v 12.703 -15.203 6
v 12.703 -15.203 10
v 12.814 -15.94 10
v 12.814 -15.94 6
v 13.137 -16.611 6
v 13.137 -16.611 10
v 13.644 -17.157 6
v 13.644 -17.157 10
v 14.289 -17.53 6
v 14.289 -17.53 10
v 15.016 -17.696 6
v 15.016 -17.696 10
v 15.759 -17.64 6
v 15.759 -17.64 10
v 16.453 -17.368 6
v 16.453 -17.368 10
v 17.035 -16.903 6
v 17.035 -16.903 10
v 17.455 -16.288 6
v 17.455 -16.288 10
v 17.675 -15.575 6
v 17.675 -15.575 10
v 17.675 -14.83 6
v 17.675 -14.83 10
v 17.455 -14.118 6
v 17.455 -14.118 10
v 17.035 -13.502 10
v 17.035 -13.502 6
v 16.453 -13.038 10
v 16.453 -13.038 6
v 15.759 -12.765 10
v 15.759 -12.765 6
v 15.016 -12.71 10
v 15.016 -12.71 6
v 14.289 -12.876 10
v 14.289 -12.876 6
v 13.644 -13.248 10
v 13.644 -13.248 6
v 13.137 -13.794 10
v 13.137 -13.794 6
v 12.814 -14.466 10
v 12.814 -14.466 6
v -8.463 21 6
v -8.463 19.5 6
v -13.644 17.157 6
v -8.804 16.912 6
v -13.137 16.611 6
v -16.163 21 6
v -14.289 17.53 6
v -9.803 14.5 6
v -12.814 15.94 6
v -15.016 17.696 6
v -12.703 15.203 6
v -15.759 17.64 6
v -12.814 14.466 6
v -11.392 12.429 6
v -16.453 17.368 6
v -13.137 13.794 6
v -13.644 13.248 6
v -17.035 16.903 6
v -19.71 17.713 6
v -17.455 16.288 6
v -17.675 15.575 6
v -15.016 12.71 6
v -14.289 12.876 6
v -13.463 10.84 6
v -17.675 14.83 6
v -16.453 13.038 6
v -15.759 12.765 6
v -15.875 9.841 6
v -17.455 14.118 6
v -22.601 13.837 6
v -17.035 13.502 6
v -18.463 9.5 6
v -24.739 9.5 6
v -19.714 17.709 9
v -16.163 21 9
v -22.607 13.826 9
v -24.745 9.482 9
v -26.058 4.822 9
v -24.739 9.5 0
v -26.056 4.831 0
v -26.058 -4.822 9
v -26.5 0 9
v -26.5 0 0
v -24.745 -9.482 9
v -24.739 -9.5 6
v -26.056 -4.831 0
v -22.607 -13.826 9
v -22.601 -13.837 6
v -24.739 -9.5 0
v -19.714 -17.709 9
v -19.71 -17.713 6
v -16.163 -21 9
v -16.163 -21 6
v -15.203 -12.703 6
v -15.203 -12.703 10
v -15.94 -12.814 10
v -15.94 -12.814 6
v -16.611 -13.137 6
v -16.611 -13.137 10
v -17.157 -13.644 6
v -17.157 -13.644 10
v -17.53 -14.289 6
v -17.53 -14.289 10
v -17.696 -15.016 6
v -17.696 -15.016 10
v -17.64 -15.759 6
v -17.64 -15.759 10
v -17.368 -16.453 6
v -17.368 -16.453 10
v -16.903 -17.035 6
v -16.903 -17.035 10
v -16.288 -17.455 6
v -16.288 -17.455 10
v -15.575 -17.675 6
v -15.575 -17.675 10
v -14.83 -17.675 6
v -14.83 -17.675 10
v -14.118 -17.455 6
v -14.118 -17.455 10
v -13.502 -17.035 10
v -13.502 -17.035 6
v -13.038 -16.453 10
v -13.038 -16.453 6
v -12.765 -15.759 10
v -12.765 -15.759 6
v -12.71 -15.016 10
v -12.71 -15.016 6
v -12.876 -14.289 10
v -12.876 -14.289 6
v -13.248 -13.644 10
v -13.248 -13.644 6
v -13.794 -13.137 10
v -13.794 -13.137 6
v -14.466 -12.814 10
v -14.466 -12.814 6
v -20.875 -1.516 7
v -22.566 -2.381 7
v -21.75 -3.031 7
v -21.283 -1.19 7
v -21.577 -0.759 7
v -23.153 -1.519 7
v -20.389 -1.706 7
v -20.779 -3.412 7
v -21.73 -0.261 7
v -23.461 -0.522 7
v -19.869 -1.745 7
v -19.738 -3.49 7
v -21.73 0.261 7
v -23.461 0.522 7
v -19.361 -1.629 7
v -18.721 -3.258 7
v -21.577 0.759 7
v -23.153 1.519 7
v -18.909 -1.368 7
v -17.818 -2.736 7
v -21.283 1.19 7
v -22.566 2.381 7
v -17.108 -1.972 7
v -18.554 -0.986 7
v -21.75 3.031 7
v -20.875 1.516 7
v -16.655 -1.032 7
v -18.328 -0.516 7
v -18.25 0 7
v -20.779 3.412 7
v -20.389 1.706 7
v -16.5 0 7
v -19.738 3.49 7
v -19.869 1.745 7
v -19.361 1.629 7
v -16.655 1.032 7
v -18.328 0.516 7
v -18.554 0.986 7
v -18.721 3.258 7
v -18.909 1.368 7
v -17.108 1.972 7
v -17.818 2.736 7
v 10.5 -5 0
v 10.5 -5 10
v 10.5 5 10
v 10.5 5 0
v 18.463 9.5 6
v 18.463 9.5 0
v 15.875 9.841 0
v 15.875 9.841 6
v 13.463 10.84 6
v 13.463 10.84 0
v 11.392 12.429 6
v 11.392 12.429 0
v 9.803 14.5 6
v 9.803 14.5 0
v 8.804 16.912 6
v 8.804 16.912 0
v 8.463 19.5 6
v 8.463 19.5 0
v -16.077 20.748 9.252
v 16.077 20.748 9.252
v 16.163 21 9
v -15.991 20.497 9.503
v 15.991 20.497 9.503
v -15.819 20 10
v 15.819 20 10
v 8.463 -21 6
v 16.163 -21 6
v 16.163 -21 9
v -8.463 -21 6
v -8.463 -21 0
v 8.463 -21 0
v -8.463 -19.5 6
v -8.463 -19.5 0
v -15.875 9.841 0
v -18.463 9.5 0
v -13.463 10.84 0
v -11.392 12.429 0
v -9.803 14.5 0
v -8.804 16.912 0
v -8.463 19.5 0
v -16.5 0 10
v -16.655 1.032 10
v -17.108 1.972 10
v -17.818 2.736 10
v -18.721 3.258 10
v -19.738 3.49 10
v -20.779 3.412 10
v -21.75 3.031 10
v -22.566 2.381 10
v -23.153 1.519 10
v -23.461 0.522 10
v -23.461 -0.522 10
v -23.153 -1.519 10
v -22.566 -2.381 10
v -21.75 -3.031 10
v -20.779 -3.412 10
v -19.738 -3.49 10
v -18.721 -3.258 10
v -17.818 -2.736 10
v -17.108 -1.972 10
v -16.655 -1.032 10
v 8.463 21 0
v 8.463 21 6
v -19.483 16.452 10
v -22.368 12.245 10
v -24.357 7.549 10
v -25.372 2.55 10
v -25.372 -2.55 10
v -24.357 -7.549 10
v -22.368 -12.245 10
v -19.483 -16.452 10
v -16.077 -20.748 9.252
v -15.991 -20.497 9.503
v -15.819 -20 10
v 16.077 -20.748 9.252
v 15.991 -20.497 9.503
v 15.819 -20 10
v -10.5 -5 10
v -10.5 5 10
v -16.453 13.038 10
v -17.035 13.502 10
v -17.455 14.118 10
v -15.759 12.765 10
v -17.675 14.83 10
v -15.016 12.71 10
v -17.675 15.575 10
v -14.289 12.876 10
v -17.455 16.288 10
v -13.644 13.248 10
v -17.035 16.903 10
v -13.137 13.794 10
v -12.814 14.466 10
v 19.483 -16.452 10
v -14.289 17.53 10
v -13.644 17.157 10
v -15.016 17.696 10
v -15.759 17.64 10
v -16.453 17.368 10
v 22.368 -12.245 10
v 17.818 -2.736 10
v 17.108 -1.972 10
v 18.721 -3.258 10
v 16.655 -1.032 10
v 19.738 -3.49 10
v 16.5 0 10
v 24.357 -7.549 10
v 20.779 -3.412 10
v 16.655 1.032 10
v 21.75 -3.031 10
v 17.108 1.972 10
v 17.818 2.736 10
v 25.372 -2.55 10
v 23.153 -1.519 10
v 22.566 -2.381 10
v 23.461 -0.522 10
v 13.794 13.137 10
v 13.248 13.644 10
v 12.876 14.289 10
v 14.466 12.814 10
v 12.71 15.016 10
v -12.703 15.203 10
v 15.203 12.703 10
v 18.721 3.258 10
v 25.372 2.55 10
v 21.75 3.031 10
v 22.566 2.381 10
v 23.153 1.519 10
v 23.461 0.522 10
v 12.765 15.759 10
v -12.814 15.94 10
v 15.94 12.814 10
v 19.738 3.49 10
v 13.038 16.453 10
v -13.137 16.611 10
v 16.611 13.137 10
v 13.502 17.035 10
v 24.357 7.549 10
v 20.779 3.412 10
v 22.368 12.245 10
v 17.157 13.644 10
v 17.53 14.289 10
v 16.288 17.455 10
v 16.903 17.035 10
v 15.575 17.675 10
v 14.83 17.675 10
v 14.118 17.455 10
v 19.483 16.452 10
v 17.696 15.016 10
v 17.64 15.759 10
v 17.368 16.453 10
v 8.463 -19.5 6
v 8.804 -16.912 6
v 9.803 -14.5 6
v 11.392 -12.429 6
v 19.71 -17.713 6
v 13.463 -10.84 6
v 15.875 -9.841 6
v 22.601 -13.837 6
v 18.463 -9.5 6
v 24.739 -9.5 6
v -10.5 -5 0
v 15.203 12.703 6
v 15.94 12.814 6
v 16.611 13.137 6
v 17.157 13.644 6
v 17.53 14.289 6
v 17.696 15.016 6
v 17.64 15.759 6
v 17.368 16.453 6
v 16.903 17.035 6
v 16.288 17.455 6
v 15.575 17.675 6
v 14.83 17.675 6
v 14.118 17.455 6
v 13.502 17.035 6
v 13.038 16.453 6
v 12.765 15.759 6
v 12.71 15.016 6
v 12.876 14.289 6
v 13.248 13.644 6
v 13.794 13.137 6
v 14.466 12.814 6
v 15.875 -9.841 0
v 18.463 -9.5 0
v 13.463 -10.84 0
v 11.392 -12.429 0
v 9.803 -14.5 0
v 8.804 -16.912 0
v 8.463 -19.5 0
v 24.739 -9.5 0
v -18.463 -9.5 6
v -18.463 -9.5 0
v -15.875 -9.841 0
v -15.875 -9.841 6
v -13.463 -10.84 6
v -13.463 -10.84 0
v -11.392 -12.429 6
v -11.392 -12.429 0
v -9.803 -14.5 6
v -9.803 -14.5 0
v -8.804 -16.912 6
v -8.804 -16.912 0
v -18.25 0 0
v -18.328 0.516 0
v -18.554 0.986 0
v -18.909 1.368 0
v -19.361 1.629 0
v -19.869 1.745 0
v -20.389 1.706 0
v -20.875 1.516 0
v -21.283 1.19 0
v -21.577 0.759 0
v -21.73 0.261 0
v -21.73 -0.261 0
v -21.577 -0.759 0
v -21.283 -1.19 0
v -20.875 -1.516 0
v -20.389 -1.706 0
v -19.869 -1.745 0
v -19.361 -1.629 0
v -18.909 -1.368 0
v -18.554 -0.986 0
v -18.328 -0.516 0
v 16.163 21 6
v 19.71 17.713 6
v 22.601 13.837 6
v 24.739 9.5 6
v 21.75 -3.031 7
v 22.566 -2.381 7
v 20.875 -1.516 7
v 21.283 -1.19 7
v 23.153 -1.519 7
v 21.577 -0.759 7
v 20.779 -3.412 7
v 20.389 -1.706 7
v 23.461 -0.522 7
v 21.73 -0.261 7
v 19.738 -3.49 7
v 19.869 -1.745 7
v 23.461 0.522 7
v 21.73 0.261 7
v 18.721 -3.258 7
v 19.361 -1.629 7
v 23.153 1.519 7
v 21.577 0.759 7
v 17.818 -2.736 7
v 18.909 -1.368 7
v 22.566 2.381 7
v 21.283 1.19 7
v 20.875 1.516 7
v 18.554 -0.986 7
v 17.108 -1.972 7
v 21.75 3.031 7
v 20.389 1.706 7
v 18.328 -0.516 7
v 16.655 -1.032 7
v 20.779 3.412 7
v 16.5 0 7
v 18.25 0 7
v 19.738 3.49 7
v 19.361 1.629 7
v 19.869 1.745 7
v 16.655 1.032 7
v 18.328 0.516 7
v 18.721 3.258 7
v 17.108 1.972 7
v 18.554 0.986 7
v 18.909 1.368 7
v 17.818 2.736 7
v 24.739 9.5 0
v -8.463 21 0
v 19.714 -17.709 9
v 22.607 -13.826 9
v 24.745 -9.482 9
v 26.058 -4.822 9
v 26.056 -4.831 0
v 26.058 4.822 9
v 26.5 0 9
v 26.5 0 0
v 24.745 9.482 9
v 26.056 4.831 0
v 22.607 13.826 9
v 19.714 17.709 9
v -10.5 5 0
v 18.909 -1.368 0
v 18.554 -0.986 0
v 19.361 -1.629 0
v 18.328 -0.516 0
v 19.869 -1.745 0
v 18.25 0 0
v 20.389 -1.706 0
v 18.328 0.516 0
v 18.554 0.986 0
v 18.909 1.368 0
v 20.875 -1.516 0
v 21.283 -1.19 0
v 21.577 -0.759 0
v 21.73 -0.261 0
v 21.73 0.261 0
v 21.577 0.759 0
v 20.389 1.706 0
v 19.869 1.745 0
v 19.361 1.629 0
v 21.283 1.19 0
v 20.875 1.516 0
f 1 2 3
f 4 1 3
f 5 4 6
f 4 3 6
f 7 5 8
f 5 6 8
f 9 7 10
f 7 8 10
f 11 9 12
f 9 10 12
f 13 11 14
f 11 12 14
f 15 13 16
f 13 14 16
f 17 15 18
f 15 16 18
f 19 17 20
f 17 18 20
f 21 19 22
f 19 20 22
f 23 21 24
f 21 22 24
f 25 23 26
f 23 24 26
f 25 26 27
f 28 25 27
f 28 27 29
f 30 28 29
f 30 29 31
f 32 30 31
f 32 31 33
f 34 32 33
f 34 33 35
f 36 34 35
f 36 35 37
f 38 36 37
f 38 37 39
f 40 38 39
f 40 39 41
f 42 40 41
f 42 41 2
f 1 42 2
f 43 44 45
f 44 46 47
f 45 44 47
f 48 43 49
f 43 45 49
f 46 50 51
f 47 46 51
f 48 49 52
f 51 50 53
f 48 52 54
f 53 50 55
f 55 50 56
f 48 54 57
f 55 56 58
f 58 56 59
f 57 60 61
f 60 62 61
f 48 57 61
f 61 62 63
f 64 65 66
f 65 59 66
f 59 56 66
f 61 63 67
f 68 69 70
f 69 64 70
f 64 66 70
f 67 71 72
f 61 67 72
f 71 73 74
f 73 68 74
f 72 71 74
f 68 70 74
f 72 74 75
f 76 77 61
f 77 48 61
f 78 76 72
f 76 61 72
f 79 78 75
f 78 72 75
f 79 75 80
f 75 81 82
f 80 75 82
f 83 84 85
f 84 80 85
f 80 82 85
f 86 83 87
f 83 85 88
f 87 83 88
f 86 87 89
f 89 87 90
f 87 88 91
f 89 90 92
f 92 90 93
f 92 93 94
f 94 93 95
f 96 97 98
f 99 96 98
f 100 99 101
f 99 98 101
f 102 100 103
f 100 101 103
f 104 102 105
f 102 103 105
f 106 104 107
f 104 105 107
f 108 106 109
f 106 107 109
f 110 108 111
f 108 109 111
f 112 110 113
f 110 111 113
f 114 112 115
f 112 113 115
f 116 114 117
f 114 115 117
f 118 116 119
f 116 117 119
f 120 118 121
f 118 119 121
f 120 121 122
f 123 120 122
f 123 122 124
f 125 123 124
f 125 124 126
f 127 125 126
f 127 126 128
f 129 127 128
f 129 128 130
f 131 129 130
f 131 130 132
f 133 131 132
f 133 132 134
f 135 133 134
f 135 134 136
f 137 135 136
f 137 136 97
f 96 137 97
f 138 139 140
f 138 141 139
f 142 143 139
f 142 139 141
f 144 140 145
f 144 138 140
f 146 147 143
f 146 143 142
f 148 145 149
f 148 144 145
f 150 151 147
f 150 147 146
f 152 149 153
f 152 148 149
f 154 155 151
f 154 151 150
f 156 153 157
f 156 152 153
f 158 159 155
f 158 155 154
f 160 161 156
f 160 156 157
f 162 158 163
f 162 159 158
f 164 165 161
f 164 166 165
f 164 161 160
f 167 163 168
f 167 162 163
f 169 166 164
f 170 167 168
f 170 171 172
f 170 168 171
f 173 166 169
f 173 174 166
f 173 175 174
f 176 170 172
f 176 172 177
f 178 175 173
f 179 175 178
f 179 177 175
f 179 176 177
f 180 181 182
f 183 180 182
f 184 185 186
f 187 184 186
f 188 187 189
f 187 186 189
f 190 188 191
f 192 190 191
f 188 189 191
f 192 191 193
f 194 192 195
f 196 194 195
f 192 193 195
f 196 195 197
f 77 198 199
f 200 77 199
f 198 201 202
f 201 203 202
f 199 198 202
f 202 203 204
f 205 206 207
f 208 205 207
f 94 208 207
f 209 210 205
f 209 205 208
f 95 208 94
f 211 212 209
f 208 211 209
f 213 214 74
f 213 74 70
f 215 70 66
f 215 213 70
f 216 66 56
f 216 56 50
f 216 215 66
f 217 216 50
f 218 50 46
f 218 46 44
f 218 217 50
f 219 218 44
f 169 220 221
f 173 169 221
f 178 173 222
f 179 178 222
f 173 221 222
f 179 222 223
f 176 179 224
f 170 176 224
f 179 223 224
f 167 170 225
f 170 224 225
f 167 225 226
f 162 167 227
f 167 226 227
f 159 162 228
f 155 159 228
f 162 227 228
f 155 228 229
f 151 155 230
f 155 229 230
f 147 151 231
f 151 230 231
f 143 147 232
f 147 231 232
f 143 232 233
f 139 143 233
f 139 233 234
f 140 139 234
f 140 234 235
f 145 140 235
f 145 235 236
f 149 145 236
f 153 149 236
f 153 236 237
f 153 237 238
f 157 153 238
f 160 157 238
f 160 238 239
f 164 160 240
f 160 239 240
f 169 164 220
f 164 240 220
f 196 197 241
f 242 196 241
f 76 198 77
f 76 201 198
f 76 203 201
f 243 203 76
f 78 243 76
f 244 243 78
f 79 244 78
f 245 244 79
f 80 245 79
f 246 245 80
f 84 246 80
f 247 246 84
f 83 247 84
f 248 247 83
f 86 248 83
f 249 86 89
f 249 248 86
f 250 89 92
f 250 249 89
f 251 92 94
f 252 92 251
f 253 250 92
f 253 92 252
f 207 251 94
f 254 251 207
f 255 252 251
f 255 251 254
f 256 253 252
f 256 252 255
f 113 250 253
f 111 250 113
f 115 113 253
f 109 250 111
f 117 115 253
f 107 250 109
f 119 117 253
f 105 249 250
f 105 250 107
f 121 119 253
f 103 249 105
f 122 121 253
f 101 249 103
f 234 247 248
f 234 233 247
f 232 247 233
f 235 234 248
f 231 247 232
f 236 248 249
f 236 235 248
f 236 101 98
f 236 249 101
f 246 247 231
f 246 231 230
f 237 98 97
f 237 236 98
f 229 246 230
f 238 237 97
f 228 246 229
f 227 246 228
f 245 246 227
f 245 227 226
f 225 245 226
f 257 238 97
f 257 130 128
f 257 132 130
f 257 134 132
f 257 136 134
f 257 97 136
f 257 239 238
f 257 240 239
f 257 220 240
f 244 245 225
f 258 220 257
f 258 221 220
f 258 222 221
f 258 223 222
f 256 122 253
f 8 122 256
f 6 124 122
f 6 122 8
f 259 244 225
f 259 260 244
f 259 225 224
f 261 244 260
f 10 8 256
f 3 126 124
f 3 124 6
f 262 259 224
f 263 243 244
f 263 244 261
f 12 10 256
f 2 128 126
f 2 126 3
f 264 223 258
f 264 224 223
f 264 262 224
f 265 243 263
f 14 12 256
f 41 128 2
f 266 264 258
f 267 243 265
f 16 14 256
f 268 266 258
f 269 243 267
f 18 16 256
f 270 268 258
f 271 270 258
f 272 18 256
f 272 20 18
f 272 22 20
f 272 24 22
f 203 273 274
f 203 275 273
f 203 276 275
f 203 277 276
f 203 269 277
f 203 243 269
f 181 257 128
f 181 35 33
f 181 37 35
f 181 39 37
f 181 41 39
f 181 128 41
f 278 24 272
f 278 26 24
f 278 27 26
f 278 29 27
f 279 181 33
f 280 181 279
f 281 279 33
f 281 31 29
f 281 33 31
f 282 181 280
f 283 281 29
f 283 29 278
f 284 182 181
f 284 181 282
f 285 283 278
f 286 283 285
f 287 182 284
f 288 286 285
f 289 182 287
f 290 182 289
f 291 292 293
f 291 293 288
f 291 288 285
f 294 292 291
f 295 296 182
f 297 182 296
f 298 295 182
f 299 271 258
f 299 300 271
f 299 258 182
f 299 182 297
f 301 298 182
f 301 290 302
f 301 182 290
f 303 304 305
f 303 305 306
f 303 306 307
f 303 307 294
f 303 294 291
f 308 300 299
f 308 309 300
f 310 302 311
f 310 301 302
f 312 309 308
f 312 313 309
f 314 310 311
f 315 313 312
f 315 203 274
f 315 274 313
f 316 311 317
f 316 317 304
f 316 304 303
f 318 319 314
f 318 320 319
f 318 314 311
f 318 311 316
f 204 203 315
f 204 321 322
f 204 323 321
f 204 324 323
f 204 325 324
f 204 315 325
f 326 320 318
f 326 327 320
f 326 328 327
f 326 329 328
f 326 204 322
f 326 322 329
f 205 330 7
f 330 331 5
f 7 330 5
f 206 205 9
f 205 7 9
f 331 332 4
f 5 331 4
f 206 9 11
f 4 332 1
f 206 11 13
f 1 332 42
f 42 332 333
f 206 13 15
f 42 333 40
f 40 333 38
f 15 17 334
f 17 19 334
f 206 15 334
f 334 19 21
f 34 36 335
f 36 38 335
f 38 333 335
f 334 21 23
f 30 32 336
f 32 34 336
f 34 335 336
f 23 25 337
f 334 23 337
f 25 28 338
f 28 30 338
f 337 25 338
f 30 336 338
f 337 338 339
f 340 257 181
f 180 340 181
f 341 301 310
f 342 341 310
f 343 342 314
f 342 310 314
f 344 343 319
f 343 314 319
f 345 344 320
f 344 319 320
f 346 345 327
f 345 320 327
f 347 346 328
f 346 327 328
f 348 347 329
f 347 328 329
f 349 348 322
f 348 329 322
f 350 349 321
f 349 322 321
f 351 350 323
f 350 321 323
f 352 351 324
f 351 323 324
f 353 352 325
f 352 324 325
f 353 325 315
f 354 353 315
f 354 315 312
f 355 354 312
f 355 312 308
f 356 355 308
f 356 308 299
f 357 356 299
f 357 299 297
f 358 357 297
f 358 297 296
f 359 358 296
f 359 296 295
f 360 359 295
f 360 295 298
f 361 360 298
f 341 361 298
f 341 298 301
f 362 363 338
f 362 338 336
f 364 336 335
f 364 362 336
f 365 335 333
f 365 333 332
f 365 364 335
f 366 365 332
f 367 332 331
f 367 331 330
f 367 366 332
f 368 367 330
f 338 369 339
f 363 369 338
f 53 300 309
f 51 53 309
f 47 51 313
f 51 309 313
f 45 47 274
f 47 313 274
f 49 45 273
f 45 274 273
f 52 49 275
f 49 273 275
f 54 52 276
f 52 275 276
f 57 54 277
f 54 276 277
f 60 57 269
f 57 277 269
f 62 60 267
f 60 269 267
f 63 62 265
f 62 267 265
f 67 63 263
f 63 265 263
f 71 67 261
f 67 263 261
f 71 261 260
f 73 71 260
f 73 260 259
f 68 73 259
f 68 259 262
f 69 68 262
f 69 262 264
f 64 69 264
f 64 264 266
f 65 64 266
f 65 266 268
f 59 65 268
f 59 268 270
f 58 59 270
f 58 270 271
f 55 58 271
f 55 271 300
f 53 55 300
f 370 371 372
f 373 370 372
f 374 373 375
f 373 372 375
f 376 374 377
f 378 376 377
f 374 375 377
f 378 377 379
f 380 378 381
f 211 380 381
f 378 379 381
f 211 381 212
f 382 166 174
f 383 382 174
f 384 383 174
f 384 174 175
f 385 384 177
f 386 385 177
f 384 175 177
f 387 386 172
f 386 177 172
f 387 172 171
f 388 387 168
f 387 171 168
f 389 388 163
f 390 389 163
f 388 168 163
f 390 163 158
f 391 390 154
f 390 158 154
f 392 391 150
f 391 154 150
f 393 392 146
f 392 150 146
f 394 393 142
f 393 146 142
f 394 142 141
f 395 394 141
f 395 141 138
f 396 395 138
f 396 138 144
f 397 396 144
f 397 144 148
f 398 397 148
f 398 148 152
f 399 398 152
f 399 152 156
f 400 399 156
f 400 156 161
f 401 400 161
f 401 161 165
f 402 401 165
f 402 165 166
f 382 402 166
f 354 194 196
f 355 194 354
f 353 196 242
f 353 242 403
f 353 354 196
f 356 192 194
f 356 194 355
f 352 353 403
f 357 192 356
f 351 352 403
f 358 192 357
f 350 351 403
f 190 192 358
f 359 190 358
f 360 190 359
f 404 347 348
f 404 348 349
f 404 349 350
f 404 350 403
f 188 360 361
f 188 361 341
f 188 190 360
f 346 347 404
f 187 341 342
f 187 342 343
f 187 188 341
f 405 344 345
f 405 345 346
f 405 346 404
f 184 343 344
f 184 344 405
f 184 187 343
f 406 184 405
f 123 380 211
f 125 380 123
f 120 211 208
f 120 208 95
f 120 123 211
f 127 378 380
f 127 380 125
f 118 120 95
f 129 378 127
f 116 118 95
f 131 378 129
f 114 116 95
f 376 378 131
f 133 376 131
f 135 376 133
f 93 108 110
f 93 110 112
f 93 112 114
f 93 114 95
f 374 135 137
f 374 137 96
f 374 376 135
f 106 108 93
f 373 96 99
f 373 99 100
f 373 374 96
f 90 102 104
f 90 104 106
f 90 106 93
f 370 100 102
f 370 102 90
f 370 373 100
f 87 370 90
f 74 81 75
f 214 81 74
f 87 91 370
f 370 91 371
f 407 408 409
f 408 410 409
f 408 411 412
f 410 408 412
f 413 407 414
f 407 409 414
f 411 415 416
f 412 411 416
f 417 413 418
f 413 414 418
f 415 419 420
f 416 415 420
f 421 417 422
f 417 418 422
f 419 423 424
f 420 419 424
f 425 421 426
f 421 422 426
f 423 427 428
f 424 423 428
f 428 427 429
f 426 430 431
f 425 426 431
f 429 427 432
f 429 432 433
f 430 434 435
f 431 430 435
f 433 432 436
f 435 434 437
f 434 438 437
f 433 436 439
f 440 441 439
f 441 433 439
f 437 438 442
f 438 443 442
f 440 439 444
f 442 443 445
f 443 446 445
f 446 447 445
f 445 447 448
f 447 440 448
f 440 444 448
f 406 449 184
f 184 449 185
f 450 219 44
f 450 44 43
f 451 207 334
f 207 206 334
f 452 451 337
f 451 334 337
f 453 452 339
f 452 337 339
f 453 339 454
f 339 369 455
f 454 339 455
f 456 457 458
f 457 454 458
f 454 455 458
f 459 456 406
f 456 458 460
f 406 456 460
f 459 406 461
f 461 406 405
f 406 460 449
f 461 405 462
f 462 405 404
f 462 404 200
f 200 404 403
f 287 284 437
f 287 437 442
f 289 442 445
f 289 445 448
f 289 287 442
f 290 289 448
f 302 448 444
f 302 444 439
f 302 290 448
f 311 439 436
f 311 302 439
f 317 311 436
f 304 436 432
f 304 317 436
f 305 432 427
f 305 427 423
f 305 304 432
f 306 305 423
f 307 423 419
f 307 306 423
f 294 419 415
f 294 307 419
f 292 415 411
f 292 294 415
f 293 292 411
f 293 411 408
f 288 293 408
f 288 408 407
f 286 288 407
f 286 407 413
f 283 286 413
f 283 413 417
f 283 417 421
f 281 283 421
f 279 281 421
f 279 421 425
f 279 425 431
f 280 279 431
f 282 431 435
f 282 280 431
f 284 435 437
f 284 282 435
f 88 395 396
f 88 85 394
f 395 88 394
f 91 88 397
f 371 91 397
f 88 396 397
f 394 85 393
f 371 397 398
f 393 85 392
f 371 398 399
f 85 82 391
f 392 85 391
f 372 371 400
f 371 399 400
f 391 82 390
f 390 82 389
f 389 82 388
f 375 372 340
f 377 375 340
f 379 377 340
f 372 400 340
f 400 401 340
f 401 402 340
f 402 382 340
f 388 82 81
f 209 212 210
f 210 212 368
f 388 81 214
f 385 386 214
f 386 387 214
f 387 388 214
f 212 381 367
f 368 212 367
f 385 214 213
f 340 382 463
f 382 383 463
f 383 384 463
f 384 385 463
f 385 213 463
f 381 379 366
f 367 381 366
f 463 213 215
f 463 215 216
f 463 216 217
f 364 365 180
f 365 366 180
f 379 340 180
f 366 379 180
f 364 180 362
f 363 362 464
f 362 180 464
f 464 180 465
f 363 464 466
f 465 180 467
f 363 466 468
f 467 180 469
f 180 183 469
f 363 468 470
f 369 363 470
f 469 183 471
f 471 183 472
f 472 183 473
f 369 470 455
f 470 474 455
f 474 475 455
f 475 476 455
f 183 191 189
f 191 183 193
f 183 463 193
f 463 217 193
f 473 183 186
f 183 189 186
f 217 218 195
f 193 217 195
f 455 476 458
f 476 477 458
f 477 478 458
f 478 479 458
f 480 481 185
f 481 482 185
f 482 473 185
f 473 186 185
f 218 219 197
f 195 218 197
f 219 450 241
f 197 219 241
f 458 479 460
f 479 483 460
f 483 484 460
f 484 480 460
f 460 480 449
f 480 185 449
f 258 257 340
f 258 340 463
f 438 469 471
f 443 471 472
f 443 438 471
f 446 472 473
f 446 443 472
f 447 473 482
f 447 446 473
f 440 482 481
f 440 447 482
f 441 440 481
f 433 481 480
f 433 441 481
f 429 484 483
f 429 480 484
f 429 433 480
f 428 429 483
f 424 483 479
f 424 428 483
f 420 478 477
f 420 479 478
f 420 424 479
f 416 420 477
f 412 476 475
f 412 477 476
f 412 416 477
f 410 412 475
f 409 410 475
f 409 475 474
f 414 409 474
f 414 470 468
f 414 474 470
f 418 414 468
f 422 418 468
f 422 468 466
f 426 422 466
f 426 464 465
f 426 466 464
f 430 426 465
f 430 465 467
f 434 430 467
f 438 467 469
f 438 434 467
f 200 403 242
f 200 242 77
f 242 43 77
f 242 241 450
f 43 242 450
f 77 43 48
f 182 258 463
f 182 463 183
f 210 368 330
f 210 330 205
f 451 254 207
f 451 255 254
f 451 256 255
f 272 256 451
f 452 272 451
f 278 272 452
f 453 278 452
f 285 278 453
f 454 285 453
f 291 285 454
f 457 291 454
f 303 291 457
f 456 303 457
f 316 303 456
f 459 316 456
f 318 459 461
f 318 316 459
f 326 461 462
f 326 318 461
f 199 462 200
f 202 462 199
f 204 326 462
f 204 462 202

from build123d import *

# Parameters (mm, degrees)
SKETCH_1_R               = 26.5
EXTRUDE_1_DEPTH          = 10
SKETCH_5_R               = 2.5
CUT_EXTRUDE_4_DEPTH      = 11
PATTERN_CIRCULAR_1_COUNT = 4
CHAMFER_1_SIZE           = 1
SKETCH_6_W               = 30
SKETCH_6_H               = 30
SKETCH_8_W               = 21
SKETCH_8_H               = 10
CUT_EXTRUDE_5_DEPTH      = 11
SKETCH_9_R               = 2.5
CUT_EXTRUDE_7_DEPTH      = 6
MIRROR_3_COPY_1_SKETCH_R = 2.5
MIRROR_3_COPY_1_DEPTH    = 6
SKETCH_12_R              = 3.5
CUT_EXTRUDE_8_DEPTH      = 3
SKETCH_13_R              = 1.75
CUT_EXTRUDE_9_DEPTH      = 8
CHAMFER_2_SIZE           = 1


with BuildPart() as part:
    # Эскиз1 → Бобышка-Вытянуть1 (new body)
    with BuildSketch(Plane.XY):
        Circle(SKETCH_1_R)
    extrude(amount=EXTRUDE_1_DEPTH)

    # Эскиз5 → Вырез-Вытянуть4 (cut, through all)
    with BuildSketch(Plane.XY.offset(10)):
        with Locations((-15.202795796, 15.202795796)):
            Circle(SKETCH_5_R)
    cut_extrude_4 = extrude(amount=-CUT_EXTRUDE_4_DEPTH, mode=Mode.SUBTRACT)

    # Круговой массив1: Вырез-Вытянуть4 ×4 about axis
    pattern_circular_1_axis = Axis((0, 0, 0), (0, 0, 1))
    for i in range(1, PATTERN_CIRCULAR_1_COUNT):
        add(cut_extrude_4.rotate(pattern_circular_1_axis, i * 360 / PATTERN_CIRCULAR_1_COUNT), mode=Mode.SUBTRACT)

    # Фаска1
    chamfer_1_edges = [part.edges().sort_by_distance(p)[0] for p in [
        (-26.5, 0, 10),
    ]]
    chamfer(chamfer_1_edges, length=CHAMFER_1_SIZE)

    # Эскиз6 → Вырез-Повернуть1 (revolve, cut)
    with BuildSketch(Plane.XY):
        with Locations((15, 36)):
            Rectangle(SKETCH_6_W, SKETCH_6_H)
    cut_revolve_1 = revolve(axis=Axis((0, 0, 0), (0, 1, 0)), mode=Mode.SUBTRACT)

    # Зеркальное отражение1: Вырез-Повернуть1 across plane
    add(cut_revolve_1.mirror(Plane.ZX), mode=Mode.SUBTRACT)

    # Эскиз8 → Вырез-Вытянуть5 (cut, through all)
    with BuildSketch(Plane.XY.offset(10)):
        Rectangle(SKETCH_8_W, SKETCH_8_H)
    extrude(amount=-CUT_EXTRUDE_5_DEPTH, mode=Mode.SUBTRACT)

    # Эскиз9 → Вырез-Вытянуть7 (cut)
    with BuildSketch(Plane(origin=(0, 0, 0), x_dir=(-1, 0, 0), z_dir=(0, 0, -1))):
        with BuildLine():
            Line((28.463229875, -9.5), (24.738633754, -9.5))
            ThreePointArc((24.738633754, -9.5), (21.243895878, -15.841303227), (16.163229875, -21))
            Line((16.163229875, -21), (8.463229875, -21))
            Line((8.463229875, -21), (8.463229875, -29.5))
            Line((8.463229875, -29.5), (18.463229875, -29.5))
            Line((18.463229875, -29.5), (28.463229875, -29.5))
            Line((28.463229875, -29.5), (28.463229875, -19.5))
            Line((28.463229875, -19.5), (28.463229875, -9.5))
        make_face()
        with BuildLine():
            Line((24.738633754, -9.5), (18.463229875, -9.5))
            ThreePointArc((18.463229875, -9.5), (11.392162063, -12.428932188), (8.463229875, -19.5))
            Line((8.463229875, -19.5), (8.463229875, -21))
            Line((8.463229875, -21), (16.163229875, -21))
            ThreePointArc((16.163229875, -21), (21.243895878, -15.841303227), (24.738633754, -9.5))
        make_face()
        with Locations((15.202795796, -15.202795796)):
            Circle(SKETCH_9_R, mode=Mode.SUBTRACT)
    cut_extrude_7 = extrude(amount=-CUT_EXTRUDE_7_DEPTH, mode=Mode.SUBTRACT)

    # Зеркальное отражение2: Вырез-Вытянуть7 across plane
    add(cut_extrude_7.mirror(Plane.ZX), mode=Mode.SUBTRACT)

    # Зеркальное отражение3: Вырез-Вытянуть7 across plane
    add(cut_extrude_7.mirror(Plane(origin=(0, 0, 0), x_dir=(0, 0, 1), z_dir=(1, 0, 0))), mode=Mode.SUBTRACT)

    # Зеркальное отражение3 copy 1 sketch → Зеркальное отражение3 copy 1 (cut)
    with BuildSketch(Plane(origin=(0, 0, 0), x_dir=(1, 0, 0), z_dir=(0, 0, -1))):
        with BuildLine():
            Line((28.463229875, -9.5), (24.738633754, -9.5))
            ThreePointArc((24.738633754, -9.5), (21.243895878, -15.841303227), (16.163229875, -21))
            Line((16.163229875, -21), (8.463229875, -21))
            Line((8.463229875, -21), (8.463229875, -29.5))
            Line((8.463229875, -29.5), (18.463229875, -29.5))
            Line((18.463229875, -29.5), (28.463229875, -29.5))
            Line((28.463229875, -29.5), (28.463229875, -19.5))
            Line((28.463229875, -19.5), (28.463229875, -9.5))
        make_face()
        with BuildLine():
            Line((24.738633754, -9.5), (18.463229875, -9.5))
            ThreePointArc((18.463229875, -9.5), (11.392162063, -12.428932188), (8.463229875, -19.5))
            Line((8.463229875, -19.5), (8.463229875, -21))
            Line((8.463229875, -21), (16.163229875, -21))
            ThreePointArc((16.163229875, -21), (21.243895878, -15.841303227), (24.738633754, -9.5))
        make_face()
        with Locations((15.202795796, -15.202795796)):
            Circle(MIRROR_3_COPY_1_SKETCH_R, mode=Mode.SUBTRACT)
    extrude(amount=-MIRROR_3_COPY_1_DEPTH, mode=Mode.SUBTRACT)

    # Эскиз12 → Вырез-Вытянуть8 (cut)
    with BuildSketch(Plane.XY.offset(10)):
        with Locations((-20, 0)):
            Circle(SKETCH_12_R)
    cut_extrude_8 = extrude(amount=-CUT_EXTRUDE_8_DEPTH, mode=Mode.SUBTRACT)

    # Эскиз13 → Вырез-Вытянуть9 (cut, through all)
    with BuildSketch(Plane.XY.offset(7)):
        with Locations((-20, 0)):
            Circle(SKETCH_13_R)
    cut_extrude_9 = extrude(amount=-CUT_EXTRUDE_9_DEPTH, mode=Mode.SUBTRACT)

    # Зеркальное отражение4: Вырез-Вытянуть8, Вырез-Вытянуть9 across plane
    add(cut_extrude_8.mirror(Plane(origin=(0, 0, 0), x_dir=(0, 0, 1), z_dir=(1, 0, 0))), mode=Mode.SUBTRACT)
    add(cut_extrude_9.mirror(Plane(origin=(0, 0, 0), x_dir=(0, 0, 1), z_dir=(1, 0, 0))), mode=Mode.SUBTRACT)

    # Фаска2
    chamfer_2_edges = [part.edges().sort_by_distance(p)[0] for p in [
        (0, -21, 10),
        (0, 21, 10),
    ]]
    chamfer(chamfer_2_edges, length=CHAMFER_2_SIZE)


solid = part.part
